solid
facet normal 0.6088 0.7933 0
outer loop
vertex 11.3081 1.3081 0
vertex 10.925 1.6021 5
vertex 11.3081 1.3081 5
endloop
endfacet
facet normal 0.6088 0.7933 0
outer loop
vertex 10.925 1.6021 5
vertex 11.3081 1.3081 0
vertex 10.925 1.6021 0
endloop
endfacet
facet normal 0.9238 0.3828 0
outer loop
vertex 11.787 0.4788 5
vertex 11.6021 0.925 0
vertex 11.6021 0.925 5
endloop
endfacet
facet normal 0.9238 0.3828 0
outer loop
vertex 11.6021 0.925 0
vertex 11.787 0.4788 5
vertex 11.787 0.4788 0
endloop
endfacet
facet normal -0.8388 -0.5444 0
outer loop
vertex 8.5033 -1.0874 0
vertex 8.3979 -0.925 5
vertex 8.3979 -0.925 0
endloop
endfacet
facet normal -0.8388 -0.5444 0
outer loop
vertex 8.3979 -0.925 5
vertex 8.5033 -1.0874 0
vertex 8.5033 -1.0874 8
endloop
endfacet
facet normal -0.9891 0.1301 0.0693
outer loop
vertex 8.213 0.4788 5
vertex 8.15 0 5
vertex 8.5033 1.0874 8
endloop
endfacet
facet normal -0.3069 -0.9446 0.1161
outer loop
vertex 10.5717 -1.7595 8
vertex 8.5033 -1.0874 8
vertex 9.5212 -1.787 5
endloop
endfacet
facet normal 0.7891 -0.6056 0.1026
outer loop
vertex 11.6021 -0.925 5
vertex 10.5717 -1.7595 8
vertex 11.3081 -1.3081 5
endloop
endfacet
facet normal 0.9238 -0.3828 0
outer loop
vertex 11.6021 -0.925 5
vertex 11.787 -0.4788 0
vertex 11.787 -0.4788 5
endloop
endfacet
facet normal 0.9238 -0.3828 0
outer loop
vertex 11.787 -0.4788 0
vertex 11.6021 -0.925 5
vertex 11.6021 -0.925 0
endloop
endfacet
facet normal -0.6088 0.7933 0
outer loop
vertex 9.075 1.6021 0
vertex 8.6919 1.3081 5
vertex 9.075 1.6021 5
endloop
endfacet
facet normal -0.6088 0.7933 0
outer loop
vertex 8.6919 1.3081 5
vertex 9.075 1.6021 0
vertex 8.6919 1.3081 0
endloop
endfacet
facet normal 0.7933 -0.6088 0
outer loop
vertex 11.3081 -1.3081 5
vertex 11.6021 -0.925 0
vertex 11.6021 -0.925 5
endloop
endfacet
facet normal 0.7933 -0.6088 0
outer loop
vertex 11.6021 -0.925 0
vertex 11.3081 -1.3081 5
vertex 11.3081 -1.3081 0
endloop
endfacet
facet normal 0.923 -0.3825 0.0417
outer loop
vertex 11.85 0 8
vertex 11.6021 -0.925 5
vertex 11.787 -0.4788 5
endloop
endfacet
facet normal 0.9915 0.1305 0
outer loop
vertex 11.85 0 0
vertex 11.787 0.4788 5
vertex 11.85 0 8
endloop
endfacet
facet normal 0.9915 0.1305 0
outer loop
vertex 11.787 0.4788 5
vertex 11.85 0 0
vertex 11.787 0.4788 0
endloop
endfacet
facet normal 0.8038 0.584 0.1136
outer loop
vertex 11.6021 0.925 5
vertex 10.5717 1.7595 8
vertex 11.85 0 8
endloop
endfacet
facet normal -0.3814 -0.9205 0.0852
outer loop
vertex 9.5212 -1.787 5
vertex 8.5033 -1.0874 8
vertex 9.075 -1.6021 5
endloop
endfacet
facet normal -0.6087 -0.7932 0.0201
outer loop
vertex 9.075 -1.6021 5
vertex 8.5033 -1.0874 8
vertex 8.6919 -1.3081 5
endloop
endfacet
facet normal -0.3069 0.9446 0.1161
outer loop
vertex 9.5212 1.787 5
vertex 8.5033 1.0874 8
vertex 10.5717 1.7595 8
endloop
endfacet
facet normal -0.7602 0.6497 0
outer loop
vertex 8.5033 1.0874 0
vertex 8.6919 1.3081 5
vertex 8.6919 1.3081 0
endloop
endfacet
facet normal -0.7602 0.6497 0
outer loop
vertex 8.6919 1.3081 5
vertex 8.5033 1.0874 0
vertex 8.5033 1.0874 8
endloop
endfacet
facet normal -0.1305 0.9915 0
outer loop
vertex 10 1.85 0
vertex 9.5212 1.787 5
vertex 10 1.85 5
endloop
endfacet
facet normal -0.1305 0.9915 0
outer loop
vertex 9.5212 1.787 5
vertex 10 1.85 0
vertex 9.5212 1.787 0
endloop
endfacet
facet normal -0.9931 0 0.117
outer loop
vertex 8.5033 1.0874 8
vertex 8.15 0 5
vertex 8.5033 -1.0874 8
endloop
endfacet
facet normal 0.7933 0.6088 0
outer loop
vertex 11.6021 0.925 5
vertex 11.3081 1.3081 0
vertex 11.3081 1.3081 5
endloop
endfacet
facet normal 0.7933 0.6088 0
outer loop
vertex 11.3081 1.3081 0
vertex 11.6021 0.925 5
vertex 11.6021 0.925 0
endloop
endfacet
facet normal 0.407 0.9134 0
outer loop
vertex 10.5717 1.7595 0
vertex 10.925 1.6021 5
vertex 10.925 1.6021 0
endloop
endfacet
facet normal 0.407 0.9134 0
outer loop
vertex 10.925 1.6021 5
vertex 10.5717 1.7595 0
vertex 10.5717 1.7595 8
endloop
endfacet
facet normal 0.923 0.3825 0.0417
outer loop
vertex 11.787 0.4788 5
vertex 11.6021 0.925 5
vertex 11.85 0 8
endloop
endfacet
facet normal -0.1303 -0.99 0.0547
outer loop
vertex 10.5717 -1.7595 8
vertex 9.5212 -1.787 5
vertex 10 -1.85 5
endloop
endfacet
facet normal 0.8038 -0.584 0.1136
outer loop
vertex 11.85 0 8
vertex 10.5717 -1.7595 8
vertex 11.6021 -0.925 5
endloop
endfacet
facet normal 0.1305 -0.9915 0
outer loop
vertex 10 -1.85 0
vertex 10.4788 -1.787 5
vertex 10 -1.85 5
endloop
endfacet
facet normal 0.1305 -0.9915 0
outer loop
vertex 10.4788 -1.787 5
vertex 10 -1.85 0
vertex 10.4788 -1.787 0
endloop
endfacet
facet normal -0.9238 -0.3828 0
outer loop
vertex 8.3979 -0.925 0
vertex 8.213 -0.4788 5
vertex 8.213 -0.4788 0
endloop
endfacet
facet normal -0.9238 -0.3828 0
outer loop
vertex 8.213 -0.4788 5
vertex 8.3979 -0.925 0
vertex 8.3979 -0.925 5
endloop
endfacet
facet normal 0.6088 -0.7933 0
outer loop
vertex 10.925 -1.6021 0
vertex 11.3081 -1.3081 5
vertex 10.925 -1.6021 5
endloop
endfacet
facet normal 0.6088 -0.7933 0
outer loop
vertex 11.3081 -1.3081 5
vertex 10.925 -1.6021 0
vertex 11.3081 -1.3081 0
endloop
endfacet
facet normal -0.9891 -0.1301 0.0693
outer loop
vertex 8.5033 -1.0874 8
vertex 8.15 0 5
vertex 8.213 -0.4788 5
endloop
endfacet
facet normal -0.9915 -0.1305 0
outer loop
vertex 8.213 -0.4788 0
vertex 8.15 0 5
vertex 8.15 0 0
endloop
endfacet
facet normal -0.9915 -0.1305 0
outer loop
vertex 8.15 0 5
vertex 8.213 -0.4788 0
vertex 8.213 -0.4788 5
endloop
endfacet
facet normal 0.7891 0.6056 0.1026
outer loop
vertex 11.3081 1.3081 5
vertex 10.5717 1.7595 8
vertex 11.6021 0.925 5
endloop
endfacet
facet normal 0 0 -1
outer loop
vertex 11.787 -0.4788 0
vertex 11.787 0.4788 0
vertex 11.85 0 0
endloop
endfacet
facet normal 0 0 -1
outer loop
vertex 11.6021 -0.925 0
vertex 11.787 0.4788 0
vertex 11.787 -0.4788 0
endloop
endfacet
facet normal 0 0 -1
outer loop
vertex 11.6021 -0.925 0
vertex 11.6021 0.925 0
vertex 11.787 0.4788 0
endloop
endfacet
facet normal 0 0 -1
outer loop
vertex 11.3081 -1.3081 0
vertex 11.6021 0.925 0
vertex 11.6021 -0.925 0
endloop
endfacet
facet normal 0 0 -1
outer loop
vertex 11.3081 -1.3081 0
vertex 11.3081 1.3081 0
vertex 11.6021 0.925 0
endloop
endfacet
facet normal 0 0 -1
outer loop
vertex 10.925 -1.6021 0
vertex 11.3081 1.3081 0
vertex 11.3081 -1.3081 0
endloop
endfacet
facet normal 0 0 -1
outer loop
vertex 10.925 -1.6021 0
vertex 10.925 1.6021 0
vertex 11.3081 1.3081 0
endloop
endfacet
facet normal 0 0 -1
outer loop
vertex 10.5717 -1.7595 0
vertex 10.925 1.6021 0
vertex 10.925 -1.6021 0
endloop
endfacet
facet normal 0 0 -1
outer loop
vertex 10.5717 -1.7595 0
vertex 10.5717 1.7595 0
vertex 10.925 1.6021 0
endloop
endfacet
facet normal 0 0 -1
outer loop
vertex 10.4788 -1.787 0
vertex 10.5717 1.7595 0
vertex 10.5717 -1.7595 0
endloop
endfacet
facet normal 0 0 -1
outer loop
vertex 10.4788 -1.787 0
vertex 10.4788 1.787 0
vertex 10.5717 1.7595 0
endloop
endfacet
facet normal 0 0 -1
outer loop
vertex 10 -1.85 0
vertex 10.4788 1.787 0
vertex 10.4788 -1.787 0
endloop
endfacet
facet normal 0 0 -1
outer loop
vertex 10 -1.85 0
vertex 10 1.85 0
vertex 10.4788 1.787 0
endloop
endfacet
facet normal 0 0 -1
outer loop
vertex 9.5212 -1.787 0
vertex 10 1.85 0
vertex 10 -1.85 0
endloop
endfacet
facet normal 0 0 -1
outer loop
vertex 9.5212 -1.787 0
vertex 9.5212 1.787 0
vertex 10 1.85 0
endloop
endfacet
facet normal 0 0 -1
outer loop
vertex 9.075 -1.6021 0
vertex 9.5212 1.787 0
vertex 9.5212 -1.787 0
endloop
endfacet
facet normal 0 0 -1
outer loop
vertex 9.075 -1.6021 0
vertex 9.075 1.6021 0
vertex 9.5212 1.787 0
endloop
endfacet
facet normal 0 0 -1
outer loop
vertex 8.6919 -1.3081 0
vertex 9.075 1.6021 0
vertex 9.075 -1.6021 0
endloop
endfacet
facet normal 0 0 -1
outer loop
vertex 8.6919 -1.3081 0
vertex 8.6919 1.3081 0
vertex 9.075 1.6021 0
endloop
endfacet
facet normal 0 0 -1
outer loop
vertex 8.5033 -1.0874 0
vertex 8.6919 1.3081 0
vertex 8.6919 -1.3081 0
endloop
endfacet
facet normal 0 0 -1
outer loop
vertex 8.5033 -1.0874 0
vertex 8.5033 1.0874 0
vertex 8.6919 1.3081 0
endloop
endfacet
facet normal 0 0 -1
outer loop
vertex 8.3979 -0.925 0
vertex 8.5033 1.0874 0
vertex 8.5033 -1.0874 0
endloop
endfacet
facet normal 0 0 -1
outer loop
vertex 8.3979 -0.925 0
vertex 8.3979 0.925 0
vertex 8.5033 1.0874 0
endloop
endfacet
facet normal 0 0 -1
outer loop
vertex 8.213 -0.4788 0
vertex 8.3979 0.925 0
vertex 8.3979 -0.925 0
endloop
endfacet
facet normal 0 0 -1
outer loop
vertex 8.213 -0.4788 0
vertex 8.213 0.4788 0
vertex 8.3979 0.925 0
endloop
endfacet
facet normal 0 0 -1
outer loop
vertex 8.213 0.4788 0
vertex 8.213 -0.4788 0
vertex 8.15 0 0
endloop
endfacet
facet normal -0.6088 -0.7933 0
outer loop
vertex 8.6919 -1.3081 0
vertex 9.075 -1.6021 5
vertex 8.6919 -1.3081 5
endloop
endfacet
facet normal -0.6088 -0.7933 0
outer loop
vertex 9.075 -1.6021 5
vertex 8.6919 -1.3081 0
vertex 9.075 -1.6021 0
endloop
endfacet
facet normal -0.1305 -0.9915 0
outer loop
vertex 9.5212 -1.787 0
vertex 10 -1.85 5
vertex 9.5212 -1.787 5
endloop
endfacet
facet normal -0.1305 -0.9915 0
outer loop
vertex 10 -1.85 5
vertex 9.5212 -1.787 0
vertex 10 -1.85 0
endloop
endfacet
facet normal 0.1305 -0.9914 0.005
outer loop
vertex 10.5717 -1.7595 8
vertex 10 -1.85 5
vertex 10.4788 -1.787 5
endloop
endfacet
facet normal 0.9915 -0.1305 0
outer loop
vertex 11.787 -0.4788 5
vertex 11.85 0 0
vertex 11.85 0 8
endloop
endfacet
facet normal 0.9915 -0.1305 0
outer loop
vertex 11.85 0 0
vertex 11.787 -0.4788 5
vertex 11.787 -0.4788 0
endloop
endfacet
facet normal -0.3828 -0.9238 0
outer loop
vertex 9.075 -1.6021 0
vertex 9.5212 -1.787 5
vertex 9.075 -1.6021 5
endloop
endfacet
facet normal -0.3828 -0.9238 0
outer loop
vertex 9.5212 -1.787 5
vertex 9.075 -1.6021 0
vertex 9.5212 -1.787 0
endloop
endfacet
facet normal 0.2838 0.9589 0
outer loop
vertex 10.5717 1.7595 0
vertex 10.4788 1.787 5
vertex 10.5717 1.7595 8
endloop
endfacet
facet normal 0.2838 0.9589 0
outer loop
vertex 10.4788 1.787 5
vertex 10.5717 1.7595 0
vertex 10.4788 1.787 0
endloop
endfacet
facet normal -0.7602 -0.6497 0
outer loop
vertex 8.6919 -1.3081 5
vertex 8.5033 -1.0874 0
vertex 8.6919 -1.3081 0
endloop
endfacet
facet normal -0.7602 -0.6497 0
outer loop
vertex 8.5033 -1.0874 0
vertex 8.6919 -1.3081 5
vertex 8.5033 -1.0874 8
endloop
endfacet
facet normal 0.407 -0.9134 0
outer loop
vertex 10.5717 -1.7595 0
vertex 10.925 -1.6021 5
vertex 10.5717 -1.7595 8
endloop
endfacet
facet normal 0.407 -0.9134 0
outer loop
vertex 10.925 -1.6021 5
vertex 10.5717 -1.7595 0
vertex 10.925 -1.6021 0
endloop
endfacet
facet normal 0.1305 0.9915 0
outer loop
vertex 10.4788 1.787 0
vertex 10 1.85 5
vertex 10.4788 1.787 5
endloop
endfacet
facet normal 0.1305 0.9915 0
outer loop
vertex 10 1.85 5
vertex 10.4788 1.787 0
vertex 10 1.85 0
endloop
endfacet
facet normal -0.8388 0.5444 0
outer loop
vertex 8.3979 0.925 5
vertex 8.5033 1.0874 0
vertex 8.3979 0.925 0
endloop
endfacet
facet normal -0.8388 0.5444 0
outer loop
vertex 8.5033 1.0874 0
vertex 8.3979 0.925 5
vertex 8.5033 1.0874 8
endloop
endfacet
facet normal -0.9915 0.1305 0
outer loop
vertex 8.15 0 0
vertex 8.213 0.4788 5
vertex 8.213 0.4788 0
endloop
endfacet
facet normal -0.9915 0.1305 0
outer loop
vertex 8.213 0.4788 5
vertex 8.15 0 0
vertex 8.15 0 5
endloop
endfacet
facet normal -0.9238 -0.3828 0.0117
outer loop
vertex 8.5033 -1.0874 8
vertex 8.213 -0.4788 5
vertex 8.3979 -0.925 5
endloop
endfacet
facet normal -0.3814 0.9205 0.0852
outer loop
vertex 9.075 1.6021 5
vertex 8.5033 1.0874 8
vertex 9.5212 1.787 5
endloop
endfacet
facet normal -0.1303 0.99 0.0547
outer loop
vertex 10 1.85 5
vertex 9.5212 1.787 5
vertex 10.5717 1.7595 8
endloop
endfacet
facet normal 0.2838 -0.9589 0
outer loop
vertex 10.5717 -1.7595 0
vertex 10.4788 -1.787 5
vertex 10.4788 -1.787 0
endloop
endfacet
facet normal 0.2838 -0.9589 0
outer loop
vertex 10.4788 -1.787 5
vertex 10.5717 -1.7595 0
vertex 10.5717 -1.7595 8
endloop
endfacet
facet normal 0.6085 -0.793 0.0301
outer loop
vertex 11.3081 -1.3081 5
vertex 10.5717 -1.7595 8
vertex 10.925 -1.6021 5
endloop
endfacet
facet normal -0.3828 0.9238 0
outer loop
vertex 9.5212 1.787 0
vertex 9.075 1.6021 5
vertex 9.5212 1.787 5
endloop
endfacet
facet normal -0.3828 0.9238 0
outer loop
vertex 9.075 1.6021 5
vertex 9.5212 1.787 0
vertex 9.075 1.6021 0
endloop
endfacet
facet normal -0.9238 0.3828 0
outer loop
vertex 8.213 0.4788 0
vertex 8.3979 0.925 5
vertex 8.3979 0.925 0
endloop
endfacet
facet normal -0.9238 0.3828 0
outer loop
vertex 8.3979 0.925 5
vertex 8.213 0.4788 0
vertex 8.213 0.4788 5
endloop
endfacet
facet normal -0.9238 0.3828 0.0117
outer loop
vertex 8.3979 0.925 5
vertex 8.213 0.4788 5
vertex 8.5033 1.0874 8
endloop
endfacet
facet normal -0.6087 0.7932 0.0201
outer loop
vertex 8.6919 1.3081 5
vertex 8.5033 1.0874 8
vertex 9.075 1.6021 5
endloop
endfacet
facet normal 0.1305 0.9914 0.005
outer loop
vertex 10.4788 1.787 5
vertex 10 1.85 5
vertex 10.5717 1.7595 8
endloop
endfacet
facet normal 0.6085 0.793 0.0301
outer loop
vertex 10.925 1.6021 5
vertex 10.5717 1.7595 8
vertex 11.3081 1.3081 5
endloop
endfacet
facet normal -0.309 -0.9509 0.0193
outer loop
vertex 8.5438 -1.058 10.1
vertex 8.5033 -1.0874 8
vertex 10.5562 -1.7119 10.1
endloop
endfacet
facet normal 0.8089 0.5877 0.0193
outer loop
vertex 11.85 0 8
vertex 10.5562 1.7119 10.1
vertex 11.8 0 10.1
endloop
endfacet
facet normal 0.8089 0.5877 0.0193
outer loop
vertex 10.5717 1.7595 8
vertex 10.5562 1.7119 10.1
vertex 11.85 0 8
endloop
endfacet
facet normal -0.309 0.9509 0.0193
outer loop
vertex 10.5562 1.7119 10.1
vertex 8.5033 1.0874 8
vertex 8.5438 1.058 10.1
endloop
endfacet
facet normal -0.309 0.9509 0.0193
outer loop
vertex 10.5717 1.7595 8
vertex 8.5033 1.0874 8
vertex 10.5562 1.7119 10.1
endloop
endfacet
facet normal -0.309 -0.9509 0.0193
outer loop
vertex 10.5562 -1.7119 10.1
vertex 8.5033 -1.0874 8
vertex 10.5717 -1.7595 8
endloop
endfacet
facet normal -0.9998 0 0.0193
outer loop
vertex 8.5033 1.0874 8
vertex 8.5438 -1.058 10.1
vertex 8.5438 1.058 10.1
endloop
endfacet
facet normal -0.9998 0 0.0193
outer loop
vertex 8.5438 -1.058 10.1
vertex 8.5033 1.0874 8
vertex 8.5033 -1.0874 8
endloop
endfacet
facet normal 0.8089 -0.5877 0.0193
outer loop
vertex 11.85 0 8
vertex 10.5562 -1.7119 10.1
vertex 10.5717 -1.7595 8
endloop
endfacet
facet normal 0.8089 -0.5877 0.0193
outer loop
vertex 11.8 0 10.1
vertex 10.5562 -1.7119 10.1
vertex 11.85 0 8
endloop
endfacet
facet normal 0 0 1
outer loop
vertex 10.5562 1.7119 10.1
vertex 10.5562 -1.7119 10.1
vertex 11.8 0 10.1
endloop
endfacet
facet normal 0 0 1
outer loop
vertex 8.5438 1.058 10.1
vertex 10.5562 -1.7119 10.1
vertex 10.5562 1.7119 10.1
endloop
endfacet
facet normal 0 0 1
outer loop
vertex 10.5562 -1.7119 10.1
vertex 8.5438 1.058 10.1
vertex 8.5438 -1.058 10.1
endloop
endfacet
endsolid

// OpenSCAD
$fn=24;

render()difference() {
	union() {
		hull() {
			cylinder(h=2, d=8);
			translate([10,0])cylinder(h=2, d=8);
		}
		translate([10,0])cylinder(h=10, d=8);
	}

	cylinder(h=2, d=3.7);
!	translate([10,0]) {
		hull() {
			cylinder(h=5, d=3.7);
			cylinder(h=8, d=3.7, $fn=5);
		}
		translate([0,0,8])cylinder(h=2.1, d1=3.7, d2=3.6, $fn=5);
	}
}
